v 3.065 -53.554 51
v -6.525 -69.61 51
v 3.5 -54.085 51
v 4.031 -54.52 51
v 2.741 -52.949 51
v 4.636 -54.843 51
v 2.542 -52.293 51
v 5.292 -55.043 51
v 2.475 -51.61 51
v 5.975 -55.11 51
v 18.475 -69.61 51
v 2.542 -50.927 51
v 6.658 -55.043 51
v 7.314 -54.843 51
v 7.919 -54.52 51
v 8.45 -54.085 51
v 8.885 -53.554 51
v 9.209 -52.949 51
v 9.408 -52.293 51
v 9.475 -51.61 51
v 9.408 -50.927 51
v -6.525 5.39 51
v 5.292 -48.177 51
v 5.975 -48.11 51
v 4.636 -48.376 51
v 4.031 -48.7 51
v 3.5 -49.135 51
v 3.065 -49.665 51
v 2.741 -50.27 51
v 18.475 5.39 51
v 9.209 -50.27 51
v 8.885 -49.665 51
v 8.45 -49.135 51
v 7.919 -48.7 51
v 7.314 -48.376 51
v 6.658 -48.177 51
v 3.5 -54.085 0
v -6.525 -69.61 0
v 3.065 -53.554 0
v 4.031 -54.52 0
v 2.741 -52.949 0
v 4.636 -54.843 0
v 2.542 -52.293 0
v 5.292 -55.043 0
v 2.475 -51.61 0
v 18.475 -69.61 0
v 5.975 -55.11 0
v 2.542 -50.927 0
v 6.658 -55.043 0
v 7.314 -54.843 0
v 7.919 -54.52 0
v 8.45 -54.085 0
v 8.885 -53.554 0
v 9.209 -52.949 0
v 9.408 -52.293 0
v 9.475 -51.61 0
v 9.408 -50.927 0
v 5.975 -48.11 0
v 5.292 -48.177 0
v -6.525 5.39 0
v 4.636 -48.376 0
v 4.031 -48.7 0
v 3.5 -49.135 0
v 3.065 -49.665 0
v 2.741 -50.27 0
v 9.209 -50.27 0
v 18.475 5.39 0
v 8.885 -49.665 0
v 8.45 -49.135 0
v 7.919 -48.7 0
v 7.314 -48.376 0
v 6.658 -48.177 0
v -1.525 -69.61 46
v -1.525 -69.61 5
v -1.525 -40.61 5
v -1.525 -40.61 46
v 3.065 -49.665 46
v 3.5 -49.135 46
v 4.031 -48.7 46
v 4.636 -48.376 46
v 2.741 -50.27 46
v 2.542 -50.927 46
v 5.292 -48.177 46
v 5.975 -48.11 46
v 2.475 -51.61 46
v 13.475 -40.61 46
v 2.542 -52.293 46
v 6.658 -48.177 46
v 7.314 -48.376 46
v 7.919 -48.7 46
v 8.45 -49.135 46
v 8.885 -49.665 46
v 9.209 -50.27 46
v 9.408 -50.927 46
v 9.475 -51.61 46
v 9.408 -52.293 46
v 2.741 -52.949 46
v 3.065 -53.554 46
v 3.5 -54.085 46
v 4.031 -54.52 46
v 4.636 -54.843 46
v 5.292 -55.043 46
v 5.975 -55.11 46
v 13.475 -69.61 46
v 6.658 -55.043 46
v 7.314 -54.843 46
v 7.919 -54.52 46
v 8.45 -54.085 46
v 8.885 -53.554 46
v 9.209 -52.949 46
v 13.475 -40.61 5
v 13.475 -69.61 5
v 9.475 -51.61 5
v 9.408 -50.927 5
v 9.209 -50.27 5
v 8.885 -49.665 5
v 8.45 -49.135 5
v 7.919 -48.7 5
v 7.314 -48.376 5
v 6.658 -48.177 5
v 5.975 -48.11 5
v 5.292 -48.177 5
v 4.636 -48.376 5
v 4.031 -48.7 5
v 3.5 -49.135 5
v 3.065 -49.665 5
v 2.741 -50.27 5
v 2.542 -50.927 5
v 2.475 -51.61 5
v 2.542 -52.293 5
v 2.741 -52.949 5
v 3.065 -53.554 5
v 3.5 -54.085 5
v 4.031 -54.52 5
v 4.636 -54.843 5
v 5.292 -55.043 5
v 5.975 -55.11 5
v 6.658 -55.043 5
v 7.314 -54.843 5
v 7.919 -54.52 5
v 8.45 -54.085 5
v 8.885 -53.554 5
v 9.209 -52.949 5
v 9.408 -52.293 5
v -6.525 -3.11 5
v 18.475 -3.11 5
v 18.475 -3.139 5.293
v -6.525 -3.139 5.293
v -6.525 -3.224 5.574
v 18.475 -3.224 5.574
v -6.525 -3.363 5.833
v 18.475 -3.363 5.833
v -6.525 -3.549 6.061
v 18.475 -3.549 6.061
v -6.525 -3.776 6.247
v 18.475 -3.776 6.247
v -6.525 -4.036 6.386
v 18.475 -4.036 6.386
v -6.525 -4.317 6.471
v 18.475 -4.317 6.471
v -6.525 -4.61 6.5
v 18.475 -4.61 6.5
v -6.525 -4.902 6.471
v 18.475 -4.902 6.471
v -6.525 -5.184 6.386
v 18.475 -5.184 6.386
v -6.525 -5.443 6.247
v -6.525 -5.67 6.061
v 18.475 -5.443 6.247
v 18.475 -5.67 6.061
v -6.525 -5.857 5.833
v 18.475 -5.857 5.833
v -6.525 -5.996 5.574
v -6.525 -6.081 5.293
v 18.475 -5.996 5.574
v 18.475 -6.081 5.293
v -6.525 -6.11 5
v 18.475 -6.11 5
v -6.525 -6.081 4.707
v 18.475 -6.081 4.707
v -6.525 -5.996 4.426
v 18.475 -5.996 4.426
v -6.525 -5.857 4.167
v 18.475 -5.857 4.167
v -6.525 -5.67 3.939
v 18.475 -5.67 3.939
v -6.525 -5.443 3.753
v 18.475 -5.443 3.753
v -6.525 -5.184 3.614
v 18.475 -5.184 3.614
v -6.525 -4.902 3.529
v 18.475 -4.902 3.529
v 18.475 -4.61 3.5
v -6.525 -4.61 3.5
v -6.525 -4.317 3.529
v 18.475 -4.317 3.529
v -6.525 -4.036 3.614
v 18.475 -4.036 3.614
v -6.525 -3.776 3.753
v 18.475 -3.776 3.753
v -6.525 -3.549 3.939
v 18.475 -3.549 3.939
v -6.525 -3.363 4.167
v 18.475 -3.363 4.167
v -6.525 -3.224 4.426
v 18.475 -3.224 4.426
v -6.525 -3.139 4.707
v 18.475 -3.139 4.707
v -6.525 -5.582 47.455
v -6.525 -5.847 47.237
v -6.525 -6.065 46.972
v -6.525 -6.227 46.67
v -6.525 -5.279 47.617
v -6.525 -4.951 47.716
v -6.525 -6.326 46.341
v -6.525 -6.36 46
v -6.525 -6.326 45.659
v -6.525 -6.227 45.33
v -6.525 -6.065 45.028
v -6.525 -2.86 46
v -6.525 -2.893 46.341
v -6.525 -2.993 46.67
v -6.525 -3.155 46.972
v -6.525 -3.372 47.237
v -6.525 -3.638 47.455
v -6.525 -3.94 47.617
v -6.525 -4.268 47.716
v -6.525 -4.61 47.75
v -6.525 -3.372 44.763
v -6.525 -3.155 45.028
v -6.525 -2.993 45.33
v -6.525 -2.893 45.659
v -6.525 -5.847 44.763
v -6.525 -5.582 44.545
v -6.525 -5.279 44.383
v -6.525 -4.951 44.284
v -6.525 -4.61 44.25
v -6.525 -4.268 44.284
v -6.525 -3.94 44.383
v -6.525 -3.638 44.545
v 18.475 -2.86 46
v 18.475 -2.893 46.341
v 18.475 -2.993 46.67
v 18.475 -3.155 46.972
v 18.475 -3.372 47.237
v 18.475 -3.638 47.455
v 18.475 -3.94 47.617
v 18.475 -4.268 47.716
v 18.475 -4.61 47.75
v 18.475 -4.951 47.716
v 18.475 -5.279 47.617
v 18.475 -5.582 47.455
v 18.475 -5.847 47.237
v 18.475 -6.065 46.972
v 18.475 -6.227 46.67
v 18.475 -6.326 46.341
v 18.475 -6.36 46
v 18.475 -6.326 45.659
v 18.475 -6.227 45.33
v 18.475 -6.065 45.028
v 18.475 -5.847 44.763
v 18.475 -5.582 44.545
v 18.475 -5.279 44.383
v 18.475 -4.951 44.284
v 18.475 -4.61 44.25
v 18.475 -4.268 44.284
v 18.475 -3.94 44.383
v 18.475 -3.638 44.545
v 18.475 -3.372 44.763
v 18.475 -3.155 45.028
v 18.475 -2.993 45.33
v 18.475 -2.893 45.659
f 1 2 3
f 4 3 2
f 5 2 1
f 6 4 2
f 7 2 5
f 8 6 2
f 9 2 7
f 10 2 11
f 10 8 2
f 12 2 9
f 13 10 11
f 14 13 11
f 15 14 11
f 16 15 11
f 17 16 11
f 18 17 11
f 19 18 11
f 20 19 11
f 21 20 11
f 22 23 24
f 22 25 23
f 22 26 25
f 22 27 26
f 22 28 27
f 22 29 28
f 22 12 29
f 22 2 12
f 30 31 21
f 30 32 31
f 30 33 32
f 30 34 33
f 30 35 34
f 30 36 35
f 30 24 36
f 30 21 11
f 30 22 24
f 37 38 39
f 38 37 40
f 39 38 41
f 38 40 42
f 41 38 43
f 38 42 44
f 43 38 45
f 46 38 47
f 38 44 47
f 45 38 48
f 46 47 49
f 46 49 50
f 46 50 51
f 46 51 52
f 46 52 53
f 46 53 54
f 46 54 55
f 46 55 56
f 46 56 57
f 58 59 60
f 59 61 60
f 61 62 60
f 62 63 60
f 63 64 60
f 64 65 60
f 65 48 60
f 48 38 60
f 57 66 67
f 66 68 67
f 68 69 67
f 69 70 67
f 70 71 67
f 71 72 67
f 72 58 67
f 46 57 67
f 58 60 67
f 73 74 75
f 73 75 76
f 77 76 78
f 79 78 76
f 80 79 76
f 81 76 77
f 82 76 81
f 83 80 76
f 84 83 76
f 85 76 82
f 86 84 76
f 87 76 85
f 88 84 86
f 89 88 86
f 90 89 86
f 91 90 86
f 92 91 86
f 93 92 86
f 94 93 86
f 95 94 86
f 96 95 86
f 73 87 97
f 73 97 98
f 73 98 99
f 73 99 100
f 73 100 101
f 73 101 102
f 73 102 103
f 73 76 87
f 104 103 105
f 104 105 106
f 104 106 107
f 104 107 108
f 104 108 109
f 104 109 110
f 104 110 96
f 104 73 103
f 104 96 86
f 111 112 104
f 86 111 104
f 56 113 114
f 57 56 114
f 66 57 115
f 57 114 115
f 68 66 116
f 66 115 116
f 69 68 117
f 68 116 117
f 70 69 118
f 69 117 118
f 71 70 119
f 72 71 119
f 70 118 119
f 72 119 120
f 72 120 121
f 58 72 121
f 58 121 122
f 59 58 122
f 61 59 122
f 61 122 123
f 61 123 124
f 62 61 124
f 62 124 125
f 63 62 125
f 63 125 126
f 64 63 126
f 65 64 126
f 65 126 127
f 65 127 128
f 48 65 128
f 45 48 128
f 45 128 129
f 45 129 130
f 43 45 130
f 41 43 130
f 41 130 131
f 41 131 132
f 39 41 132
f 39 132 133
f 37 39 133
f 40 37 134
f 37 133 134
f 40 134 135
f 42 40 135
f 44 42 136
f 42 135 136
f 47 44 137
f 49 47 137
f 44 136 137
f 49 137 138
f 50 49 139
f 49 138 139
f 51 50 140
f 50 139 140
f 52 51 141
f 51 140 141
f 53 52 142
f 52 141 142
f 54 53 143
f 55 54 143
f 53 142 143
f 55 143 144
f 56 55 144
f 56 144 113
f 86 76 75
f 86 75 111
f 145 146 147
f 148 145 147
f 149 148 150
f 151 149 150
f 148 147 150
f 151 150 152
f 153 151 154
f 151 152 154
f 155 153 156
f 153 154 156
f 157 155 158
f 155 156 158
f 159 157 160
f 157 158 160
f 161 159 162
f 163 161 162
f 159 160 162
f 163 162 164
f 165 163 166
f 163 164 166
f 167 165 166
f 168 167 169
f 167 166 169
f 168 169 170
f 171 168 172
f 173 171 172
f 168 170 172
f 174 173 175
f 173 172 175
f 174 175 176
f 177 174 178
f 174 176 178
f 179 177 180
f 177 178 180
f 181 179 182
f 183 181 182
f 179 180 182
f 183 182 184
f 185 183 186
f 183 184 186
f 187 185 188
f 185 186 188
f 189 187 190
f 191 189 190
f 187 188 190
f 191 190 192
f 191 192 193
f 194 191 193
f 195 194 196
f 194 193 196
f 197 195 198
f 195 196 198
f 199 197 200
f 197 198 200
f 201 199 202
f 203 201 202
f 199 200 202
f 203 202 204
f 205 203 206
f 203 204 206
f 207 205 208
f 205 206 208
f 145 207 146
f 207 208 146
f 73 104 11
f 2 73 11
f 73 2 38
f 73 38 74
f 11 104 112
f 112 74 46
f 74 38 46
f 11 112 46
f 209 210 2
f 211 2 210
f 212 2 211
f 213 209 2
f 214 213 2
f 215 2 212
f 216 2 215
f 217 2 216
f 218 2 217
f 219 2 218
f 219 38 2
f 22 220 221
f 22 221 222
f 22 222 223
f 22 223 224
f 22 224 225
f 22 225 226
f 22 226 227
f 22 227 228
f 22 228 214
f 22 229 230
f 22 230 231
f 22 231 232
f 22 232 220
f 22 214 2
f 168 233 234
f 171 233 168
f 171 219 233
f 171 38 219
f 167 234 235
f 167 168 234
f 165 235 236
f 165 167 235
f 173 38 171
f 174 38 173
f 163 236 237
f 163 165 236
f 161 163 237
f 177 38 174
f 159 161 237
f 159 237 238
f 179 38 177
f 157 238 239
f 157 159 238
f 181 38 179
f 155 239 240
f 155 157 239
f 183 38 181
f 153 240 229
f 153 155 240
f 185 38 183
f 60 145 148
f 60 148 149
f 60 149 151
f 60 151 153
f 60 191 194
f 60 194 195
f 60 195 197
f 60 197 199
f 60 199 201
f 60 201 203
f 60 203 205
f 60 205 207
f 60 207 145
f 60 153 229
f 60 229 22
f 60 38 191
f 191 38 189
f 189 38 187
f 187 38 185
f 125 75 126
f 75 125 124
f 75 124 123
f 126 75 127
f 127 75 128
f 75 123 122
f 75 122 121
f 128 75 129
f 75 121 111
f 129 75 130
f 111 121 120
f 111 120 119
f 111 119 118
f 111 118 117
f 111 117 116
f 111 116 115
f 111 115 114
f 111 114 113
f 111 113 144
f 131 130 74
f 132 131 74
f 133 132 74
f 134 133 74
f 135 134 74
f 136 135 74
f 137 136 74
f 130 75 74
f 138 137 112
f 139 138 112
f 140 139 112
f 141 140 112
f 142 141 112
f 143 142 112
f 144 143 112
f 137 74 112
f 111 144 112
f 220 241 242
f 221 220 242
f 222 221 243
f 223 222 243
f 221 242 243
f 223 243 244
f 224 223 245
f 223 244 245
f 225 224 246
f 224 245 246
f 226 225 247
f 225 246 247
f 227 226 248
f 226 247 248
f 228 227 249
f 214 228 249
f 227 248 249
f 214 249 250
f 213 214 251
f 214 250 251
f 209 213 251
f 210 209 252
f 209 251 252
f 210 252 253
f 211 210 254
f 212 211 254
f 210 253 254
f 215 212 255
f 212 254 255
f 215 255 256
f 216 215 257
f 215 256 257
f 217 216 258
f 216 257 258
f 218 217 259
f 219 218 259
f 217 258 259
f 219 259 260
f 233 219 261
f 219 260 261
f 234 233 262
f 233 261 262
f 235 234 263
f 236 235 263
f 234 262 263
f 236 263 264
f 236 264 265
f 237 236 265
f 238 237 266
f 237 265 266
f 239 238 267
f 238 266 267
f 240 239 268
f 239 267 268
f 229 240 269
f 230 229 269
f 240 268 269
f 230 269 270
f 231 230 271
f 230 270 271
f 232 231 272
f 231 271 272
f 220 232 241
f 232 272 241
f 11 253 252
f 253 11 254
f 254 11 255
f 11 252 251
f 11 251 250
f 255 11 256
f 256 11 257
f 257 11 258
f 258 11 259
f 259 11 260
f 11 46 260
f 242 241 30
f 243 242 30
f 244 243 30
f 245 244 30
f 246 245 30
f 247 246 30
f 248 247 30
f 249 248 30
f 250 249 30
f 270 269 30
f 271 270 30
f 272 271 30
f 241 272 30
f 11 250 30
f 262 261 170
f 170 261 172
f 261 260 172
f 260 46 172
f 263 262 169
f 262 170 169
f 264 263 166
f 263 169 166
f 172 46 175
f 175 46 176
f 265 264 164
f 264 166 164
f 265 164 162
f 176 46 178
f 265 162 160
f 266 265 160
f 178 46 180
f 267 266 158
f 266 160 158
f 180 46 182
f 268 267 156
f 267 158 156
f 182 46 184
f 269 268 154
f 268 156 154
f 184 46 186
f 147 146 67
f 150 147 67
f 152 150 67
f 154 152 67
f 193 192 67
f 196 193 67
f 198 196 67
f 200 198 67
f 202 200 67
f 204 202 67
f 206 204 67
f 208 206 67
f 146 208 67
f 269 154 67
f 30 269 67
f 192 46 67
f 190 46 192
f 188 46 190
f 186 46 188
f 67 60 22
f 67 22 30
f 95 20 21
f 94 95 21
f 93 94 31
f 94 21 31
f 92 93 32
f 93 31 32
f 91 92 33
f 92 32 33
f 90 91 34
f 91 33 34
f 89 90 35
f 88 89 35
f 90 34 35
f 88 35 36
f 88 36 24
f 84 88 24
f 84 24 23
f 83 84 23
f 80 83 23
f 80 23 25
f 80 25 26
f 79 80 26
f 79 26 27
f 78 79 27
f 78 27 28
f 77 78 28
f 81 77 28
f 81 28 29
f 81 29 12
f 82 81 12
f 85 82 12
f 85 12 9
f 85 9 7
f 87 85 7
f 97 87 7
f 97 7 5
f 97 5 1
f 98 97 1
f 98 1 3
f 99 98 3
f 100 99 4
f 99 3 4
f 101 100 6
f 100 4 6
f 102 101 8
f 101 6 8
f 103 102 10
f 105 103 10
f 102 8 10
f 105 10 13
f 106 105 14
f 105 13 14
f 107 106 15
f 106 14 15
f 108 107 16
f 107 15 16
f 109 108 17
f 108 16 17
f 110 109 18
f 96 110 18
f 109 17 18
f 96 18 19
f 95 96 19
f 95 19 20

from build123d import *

# Parameters (mm, degrees)
ESQUISSE1_W             = 25
ESQUISSE1_H             = 75
BOSS_EXTRU_1_DEPTH      = 51
ESQUISSE2_R             = 3.5
ENL_V_MAT_EXTRU_1_DEPTH = 70
ESQUISSE3_W             = 15
ESQUISSE3_H             = 41
ENL_V_MAT_EXTRU_2_DEPTH = 29
ESQUISSE4_R             = 1.75
ESQUISSE4_R_2           = 1.5
ENL_V_MAT_EXTRU_3_DEPTH = 25


with BuildPart() as part:
    # Esquisse1 → Boss.-Extru.1 (new body)
    with BuildSketch(Plane.XY):
        with Locations((5.975, -32.109782609)):
            Rectangle(ESQUISSE1_W, ESQUISSE1_H)
    extrude(amount=BOSS_EXTRU_1_DEPTH)

    # Esquisse2 → Enlèv. mat.-Extru.1 (cut)
    with BuildSketch(Plane.XY.offset(51)):
        with Locations((5.975, -51.609782609)):
            Circle(ESQUISSE2_R)
    extrude(amount=-ENL_V_MAT_EXTRU_1_DEPTH, mode=Mode.SUBTRACT)

    # Esquisse3 → Enlèv. mat.-Extru.2 (cut)
    with BuildSketch(Plane.XZ.offset(69.609782609)):
        with Locations((5.975, 25.5)):
            Rectangle(ESQUISSE3_W, ESQUISSE3_H)
    extrude(amount=-ENL_V_MAT_EXTRU_2_DEPTH, mode=Mode.SUBTRACT)

    # Esquisse4 → Enlèv. mat.-Extru.3 (cut)
    with BuildSketch(Plane(origin=(18.475, 0, 0), x_dir=(0, 0, -1), z_dir=(1, 0, 0))):
        with Locations(Location((-46, -4.609782609, 0), (0, 0, 90))):
            Circle(ESQUISSE4_R)
        with Locations(Location((-5, -4.609782609, 0), (0, 0, 90))):
            Circle(ESQUISSE4_R_2)
    extrude(amount=-ENL_V_MAT_EXTRU_3_DEPTH, mode=Mode.SUBTRACT)


solid = part.part
